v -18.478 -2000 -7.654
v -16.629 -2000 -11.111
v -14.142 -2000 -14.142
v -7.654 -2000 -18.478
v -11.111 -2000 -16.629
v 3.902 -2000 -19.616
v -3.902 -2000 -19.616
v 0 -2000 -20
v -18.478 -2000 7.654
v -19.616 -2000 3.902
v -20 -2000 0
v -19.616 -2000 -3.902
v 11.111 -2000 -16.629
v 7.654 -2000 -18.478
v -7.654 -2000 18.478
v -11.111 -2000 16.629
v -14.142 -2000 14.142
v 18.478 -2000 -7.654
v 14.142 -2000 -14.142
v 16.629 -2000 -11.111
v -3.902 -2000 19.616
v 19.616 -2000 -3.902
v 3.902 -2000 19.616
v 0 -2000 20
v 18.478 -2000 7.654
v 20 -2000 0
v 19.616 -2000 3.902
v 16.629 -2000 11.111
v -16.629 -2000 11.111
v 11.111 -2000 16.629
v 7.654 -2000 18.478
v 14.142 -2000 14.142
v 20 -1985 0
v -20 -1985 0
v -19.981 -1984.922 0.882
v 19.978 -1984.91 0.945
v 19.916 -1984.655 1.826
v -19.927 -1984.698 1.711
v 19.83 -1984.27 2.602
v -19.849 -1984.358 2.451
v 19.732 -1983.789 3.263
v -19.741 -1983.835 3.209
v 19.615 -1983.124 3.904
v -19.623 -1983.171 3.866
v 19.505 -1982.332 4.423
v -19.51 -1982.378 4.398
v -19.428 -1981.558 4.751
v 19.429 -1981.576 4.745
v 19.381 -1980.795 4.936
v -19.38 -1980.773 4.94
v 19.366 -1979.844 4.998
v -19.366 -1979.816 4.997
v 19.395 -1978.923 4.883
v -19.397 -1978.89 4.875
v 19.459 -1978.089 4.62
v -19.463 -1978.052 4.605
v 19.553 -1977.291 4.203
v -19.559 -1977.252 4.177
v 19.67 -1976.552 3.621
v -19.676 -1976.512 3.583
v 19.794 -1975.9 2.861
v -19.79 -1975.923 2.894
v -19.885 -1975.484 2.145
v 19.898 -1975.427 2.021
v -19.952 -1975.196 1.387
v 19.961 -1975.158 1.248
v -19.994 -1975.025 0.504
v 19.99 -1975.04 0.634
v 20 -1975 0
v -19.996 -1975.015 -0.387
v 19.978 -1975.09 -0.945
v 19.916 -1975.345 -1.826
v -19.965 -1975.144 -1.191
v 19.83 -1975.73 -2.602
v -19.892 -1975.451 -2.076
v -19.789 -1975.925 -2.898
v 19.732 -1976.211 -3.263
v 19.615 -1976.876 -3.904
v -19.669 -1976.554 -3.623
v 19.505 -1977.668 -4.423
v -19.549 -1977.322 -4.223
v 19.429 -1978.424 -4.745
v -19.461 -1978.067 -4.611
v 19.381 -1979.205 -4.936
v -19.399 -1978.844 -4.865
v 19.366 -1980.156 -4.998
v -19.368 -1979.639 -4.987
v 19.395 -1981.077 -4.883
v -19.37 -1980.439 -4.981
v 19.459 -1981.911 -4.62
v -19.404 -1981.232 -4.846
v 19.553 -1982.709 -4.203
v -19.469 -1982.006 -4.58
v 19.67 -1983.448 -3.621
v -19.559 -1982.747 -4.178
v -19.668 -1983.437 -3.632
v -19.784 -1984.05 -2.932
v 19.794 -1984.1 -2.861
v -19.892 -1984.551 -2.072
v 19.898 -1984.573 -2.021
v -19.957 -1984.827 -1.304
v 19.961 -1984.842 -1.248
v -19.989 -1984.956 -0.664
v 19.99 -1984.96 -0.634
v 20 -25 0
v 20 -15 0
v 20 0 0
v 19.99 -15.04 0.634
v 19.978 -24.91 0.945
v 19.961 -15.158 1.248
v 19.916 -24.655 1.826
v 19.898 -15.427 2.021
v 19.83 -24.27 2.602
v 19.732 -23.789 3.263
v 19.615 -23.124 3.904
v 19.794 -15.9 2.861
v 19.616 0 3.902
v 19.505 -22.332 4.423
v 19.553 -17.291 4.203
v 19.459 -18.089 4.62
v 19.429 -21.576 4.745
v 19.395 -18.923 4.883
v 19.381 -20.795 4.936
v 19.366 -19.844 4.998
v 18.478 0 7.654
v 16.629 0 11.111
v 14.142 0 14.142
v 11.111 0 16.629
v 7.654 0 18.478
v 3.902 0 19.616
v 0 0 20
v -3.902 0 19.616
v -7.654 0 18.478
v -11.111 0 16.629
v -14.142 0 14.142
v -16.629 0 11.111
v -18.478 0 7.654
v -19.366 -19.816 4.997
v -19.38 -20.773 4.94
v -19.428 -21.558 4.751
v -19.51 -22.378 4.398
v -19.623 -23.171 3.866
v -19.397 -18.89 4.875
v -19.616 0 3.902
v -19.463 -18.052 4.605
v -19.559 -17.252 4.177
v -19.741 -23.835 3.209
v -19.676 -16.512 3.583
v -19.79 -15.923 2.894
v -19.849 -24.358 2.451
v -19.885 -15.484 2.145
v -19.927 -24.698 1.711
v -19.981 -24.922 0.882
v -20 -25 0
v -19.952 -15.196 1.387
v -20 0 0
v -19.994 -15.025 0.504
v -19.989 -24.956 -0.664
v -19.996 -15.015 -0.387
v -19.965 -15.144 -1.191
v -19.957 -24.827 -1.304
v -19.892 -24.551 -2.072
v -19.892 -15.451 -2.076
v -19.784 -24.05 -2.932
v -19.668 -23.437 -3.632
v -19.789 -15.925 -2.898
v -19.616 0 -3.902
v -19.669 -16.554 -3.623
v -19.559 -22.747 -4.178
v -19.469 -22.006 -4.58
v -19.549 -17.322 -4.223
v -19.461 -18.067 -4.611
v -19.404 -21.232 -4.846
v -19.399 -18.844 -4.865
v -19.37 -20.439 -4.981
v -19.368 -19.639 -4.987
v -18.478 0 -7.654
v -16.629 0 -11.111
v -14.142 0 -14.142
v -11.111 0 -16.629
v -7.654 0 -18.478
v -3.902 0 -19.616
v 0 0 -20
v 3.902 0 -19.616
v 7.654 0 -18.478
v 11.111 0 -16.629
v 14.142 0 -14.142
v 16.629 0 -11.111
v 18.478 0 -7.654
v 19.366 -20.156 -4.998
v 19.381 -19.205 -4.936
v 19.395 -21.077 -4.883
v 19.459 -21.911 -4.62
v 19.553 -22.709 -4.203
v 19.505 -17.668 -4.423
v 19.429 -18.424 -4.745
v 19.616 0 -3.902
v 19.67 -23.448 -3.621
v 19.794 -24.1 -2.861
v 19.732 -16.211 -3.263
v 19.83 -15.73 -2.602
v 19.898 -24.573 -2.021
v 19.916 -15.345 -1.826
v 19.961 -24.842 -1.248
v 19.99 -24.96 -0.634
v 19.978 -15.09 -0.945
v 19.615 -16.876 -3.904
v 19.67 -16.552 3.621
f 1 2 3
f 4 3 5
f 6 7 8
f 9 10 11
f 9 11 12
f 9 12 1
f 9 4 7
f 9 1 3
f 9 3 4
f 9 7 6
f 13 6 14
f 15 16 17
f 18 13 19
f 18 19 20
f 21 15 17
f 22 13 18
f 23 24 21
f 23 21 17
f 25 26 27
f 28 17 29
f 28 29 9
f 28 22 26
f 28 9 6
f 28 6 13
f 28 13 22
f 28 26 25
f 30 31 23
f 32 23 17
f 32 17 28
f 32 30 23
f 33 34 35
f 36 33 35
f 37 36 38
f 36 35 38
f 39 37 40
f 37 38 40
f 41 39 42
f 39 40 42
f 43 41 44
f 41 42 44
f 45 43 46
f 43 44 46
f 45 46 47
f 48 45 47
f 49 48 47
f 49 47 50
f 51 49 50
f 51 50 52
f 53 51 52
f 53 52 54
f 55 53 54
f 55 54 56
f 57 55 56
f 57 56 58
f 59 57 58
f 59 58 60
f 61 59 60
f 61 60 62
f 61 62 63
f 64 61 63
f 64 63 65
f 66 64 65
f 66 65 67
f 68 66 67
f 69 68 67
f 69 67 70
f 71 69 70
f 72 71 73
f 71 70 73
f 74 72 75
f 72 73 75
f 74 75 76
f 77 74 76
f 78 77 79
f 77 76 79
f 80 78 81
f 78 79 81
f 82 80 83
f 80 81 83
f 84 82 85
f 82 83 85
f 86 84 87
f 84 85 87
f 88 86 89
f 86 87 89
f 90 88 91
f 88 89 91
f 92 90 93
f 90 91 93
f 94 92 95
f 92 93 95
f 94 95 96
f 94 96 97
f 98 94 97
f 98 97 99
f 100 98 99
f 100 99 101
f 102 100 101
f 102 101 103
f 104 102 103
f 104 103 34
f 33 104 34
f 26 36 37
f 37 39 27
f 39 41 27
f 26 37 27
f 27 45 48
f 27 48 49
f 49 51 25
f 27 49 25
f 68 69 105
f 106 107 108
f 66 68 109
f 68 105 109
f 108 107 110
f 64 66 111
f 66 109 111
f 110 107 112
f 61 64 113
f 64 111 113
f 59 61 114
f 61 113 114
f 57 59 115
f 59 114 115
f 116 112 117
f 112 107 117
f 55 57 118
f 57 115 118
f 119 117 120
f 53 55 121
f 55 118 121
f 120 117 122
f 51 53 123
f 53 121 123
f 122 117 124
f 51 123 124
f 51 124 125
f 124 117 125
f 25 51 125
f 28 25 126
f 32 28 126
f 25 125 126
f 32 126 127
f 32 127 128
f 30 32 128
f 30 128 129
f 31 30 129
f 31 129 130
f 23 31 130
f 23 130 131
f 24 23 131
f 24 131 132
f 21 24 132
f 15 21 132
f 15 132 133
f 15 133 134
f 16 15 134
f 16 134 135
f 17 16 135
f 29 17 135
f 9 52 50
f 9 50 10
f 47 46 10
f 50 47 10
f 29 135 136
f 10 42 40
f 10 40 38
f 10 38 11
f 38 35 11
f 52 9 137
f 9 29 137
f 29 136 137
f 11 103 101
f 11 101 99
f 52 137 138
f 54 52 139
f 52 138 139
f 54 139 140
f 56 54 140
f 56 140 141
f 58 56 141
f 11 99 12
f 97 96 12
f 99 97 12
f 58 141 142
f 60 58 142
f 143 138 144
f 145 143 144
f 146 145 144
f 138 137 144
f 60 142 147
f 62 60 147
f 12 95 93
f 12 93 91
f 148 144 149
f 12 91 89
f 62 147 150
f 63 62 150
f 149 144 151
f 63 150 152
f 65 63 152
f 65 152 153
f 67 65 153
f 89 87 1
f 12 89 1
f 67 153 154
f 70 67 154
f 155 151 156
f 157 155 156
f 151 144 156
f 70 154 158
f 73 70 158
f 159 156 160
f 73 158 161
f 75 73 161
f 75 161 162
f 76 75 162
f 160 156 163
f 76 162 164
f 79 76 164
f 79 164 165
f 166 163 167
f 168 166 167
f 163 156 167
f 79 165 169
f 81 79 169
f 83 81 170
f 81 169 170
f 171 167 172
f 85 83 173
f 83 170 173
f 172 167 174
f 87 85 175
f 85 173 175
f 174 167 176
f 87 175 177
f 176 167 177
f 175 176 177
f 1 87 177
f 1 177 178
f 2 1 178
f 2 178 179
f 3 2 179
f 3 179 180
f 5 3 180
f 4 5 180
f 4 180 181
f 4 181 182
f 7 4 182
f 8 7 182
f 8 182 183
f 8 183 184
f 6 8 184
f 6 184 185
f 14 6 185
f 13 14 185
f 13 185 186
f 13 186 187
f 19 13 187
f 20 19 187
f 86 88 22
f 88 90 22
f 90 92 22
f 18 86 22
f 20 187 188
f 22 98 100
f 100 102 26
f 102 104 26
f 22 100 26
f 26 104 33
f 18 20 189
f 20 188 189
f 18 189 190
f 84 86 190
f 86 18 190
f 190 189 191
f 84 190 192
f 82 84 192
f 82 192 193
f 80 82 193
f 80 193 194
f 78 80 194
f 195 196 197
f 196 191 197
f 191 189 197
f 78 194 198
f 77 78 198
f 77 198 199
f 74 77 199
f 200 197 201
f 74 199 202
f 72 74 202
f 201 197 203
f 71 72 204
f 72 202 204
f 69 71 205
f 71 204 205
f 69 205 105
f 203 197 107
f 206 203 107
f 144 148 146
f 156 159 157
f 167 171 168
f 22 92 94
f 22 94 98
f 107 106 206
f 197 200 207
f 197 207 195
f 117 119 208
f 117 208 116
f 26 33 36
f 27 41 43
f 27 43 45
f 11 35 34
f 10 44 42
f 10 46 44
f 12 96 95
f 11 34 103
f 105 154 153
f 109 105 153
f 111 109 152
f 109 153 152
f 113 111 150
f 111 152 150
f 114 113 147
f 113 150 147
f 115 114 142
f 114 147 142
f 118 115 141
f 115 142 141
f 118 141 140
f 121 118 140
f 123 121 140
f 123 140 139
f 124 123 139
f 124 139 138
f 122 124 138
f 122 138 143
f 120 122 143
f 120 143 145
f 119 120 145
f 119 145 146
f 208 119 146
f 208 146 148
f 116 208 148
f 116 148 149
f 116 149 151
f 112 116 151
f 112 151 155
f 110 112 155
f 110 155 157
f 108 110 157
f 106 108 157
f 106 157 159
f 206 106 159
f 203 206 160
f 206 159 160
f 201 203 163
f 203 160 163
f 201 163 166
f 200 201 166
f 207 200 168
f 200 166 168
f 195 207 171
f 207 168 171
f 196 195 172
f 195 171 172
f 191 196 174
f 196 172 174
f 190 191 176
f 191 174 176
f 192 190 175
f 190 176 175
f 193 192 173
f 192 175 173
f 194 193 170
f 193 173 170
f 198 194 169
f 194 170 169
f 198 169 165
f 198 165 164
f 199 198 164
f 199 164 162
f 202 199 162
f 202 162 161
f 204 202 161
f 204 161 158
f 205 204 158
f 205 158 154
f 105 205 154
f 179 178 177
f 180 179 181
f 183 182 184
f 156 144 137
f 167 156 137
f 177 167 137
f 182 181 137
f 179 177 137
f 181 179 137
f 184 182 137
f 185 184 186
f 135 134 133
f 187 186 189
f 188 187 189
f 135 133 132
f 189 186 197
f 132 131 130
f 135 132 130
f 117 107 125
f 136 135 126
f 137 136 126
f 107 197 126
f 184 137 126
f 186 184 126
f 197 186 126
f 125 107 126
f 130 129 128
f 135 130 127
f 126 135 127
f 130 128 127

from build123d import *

# Parameters (mm, degrees)
F0_R     = 20
F1_DEPTH = 2000
F3_D     = 10
F4_D     = 10
F5_D     = 10
F6_D     = 10


with BuildPart() as f1:
    # F0 (on Front) → F1 (new body)
    with BuildSketch(Plane.XZ):
        Circle(F0_R)
    extrude(amount=F1_DEPTH)

    # F3 (through all)
    with Locations(Plane.YZ):
        with Locations((-1980, 0)):
            Hole(F3_D / 2)

    # F4 (through all)
    with Locations(Plane(origin=(0, 0, 0), x_dir=(0, 1, 0), z_dir=(-1, 0, 0))):
        with Locations((-1980, 0)):
            Hole(F4_D / 2)

    # F5 (through all)
    with Locations(Plane.YZ):
        with Locations((-20, 0)):
            Hole(F5_D / 2)

    # F6 (through all)
    with Locations(Plane(origin=(0, 0, 0), x_dir=(0, 1, 0), z_dir=(-1, 0, 0))):
        with Locations((-20, 0)):
            Hole(F6_D / 2)


solid = f1.part
